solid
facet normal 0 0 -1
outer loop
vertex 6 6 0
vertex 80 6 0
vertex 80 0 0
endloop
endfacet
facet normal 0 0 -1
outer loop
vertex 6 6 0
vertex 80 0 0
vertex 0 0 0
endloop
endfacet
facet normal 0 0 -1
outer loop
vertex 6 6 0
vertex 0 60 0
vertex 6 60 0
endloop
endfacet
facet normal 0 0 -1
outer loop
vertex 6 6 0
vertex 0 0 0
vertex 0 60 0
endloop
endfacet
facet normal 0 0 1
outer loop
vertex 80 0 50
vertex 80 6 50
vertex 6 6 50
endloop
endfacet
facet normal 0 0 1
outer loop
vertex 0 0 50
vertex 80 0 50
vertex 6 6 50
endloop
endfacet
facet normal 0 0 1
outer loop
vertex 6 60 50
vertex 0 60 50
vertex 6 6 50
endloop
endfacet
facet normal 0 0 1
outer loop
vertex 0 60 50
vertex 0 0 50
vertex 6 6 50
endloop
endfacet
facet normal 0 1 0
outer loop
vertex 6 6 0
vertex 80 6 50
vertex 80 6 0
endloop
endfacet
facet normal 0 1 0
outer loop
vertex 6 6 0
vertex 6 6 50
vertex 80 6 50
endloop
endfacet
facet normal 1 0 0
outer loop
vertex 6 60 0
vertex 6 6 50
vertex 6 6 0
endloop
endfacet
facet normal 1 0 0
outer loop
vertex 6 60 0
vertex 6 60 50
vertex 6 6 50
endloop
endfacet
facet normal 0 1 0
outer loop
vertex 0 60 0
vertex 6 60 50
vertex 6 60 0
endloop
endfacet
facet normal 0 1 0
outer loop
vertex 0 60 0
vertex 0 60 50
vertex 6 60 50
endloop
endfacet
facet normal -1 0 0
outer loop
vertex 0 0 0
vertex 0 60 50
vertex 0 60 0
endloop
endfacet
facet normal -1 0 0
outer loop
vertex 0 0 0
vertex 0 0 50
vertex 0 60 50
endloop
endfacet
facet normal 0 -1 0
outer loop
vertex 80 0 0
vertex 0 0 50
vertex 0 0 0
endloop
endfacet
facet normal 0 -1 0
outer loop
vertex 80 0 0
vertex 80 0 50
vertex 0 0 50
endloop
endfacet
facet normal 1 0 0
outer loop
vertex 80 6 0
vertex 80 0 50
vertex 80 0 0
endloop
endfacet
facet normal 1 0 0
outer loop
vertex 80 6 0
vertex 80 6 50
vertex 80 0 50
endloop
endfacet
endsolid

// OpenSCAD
$fn = 32;

// ----------------------------------------------------------------------
// Structural section: angle 80 x 60 mm
// ----------------------------------------------------------------------

// --- parameters (mm) ---
sec_w = 80;               // leg width, X
sec_h = 60;               // leg height, Y
flange_t = 6;             // leg thickness
plate_t = 50;             // cut length, Z (extrusion height)

profile = [[0, 0], [80, 0], [80, 6], [6, 6], [6, 60], [0, 60]];  // primary outline, 6 points, counter clockwise

// --- the one profile operation ---
linear_extrude(height = plate_t) polygon(points = profile);
